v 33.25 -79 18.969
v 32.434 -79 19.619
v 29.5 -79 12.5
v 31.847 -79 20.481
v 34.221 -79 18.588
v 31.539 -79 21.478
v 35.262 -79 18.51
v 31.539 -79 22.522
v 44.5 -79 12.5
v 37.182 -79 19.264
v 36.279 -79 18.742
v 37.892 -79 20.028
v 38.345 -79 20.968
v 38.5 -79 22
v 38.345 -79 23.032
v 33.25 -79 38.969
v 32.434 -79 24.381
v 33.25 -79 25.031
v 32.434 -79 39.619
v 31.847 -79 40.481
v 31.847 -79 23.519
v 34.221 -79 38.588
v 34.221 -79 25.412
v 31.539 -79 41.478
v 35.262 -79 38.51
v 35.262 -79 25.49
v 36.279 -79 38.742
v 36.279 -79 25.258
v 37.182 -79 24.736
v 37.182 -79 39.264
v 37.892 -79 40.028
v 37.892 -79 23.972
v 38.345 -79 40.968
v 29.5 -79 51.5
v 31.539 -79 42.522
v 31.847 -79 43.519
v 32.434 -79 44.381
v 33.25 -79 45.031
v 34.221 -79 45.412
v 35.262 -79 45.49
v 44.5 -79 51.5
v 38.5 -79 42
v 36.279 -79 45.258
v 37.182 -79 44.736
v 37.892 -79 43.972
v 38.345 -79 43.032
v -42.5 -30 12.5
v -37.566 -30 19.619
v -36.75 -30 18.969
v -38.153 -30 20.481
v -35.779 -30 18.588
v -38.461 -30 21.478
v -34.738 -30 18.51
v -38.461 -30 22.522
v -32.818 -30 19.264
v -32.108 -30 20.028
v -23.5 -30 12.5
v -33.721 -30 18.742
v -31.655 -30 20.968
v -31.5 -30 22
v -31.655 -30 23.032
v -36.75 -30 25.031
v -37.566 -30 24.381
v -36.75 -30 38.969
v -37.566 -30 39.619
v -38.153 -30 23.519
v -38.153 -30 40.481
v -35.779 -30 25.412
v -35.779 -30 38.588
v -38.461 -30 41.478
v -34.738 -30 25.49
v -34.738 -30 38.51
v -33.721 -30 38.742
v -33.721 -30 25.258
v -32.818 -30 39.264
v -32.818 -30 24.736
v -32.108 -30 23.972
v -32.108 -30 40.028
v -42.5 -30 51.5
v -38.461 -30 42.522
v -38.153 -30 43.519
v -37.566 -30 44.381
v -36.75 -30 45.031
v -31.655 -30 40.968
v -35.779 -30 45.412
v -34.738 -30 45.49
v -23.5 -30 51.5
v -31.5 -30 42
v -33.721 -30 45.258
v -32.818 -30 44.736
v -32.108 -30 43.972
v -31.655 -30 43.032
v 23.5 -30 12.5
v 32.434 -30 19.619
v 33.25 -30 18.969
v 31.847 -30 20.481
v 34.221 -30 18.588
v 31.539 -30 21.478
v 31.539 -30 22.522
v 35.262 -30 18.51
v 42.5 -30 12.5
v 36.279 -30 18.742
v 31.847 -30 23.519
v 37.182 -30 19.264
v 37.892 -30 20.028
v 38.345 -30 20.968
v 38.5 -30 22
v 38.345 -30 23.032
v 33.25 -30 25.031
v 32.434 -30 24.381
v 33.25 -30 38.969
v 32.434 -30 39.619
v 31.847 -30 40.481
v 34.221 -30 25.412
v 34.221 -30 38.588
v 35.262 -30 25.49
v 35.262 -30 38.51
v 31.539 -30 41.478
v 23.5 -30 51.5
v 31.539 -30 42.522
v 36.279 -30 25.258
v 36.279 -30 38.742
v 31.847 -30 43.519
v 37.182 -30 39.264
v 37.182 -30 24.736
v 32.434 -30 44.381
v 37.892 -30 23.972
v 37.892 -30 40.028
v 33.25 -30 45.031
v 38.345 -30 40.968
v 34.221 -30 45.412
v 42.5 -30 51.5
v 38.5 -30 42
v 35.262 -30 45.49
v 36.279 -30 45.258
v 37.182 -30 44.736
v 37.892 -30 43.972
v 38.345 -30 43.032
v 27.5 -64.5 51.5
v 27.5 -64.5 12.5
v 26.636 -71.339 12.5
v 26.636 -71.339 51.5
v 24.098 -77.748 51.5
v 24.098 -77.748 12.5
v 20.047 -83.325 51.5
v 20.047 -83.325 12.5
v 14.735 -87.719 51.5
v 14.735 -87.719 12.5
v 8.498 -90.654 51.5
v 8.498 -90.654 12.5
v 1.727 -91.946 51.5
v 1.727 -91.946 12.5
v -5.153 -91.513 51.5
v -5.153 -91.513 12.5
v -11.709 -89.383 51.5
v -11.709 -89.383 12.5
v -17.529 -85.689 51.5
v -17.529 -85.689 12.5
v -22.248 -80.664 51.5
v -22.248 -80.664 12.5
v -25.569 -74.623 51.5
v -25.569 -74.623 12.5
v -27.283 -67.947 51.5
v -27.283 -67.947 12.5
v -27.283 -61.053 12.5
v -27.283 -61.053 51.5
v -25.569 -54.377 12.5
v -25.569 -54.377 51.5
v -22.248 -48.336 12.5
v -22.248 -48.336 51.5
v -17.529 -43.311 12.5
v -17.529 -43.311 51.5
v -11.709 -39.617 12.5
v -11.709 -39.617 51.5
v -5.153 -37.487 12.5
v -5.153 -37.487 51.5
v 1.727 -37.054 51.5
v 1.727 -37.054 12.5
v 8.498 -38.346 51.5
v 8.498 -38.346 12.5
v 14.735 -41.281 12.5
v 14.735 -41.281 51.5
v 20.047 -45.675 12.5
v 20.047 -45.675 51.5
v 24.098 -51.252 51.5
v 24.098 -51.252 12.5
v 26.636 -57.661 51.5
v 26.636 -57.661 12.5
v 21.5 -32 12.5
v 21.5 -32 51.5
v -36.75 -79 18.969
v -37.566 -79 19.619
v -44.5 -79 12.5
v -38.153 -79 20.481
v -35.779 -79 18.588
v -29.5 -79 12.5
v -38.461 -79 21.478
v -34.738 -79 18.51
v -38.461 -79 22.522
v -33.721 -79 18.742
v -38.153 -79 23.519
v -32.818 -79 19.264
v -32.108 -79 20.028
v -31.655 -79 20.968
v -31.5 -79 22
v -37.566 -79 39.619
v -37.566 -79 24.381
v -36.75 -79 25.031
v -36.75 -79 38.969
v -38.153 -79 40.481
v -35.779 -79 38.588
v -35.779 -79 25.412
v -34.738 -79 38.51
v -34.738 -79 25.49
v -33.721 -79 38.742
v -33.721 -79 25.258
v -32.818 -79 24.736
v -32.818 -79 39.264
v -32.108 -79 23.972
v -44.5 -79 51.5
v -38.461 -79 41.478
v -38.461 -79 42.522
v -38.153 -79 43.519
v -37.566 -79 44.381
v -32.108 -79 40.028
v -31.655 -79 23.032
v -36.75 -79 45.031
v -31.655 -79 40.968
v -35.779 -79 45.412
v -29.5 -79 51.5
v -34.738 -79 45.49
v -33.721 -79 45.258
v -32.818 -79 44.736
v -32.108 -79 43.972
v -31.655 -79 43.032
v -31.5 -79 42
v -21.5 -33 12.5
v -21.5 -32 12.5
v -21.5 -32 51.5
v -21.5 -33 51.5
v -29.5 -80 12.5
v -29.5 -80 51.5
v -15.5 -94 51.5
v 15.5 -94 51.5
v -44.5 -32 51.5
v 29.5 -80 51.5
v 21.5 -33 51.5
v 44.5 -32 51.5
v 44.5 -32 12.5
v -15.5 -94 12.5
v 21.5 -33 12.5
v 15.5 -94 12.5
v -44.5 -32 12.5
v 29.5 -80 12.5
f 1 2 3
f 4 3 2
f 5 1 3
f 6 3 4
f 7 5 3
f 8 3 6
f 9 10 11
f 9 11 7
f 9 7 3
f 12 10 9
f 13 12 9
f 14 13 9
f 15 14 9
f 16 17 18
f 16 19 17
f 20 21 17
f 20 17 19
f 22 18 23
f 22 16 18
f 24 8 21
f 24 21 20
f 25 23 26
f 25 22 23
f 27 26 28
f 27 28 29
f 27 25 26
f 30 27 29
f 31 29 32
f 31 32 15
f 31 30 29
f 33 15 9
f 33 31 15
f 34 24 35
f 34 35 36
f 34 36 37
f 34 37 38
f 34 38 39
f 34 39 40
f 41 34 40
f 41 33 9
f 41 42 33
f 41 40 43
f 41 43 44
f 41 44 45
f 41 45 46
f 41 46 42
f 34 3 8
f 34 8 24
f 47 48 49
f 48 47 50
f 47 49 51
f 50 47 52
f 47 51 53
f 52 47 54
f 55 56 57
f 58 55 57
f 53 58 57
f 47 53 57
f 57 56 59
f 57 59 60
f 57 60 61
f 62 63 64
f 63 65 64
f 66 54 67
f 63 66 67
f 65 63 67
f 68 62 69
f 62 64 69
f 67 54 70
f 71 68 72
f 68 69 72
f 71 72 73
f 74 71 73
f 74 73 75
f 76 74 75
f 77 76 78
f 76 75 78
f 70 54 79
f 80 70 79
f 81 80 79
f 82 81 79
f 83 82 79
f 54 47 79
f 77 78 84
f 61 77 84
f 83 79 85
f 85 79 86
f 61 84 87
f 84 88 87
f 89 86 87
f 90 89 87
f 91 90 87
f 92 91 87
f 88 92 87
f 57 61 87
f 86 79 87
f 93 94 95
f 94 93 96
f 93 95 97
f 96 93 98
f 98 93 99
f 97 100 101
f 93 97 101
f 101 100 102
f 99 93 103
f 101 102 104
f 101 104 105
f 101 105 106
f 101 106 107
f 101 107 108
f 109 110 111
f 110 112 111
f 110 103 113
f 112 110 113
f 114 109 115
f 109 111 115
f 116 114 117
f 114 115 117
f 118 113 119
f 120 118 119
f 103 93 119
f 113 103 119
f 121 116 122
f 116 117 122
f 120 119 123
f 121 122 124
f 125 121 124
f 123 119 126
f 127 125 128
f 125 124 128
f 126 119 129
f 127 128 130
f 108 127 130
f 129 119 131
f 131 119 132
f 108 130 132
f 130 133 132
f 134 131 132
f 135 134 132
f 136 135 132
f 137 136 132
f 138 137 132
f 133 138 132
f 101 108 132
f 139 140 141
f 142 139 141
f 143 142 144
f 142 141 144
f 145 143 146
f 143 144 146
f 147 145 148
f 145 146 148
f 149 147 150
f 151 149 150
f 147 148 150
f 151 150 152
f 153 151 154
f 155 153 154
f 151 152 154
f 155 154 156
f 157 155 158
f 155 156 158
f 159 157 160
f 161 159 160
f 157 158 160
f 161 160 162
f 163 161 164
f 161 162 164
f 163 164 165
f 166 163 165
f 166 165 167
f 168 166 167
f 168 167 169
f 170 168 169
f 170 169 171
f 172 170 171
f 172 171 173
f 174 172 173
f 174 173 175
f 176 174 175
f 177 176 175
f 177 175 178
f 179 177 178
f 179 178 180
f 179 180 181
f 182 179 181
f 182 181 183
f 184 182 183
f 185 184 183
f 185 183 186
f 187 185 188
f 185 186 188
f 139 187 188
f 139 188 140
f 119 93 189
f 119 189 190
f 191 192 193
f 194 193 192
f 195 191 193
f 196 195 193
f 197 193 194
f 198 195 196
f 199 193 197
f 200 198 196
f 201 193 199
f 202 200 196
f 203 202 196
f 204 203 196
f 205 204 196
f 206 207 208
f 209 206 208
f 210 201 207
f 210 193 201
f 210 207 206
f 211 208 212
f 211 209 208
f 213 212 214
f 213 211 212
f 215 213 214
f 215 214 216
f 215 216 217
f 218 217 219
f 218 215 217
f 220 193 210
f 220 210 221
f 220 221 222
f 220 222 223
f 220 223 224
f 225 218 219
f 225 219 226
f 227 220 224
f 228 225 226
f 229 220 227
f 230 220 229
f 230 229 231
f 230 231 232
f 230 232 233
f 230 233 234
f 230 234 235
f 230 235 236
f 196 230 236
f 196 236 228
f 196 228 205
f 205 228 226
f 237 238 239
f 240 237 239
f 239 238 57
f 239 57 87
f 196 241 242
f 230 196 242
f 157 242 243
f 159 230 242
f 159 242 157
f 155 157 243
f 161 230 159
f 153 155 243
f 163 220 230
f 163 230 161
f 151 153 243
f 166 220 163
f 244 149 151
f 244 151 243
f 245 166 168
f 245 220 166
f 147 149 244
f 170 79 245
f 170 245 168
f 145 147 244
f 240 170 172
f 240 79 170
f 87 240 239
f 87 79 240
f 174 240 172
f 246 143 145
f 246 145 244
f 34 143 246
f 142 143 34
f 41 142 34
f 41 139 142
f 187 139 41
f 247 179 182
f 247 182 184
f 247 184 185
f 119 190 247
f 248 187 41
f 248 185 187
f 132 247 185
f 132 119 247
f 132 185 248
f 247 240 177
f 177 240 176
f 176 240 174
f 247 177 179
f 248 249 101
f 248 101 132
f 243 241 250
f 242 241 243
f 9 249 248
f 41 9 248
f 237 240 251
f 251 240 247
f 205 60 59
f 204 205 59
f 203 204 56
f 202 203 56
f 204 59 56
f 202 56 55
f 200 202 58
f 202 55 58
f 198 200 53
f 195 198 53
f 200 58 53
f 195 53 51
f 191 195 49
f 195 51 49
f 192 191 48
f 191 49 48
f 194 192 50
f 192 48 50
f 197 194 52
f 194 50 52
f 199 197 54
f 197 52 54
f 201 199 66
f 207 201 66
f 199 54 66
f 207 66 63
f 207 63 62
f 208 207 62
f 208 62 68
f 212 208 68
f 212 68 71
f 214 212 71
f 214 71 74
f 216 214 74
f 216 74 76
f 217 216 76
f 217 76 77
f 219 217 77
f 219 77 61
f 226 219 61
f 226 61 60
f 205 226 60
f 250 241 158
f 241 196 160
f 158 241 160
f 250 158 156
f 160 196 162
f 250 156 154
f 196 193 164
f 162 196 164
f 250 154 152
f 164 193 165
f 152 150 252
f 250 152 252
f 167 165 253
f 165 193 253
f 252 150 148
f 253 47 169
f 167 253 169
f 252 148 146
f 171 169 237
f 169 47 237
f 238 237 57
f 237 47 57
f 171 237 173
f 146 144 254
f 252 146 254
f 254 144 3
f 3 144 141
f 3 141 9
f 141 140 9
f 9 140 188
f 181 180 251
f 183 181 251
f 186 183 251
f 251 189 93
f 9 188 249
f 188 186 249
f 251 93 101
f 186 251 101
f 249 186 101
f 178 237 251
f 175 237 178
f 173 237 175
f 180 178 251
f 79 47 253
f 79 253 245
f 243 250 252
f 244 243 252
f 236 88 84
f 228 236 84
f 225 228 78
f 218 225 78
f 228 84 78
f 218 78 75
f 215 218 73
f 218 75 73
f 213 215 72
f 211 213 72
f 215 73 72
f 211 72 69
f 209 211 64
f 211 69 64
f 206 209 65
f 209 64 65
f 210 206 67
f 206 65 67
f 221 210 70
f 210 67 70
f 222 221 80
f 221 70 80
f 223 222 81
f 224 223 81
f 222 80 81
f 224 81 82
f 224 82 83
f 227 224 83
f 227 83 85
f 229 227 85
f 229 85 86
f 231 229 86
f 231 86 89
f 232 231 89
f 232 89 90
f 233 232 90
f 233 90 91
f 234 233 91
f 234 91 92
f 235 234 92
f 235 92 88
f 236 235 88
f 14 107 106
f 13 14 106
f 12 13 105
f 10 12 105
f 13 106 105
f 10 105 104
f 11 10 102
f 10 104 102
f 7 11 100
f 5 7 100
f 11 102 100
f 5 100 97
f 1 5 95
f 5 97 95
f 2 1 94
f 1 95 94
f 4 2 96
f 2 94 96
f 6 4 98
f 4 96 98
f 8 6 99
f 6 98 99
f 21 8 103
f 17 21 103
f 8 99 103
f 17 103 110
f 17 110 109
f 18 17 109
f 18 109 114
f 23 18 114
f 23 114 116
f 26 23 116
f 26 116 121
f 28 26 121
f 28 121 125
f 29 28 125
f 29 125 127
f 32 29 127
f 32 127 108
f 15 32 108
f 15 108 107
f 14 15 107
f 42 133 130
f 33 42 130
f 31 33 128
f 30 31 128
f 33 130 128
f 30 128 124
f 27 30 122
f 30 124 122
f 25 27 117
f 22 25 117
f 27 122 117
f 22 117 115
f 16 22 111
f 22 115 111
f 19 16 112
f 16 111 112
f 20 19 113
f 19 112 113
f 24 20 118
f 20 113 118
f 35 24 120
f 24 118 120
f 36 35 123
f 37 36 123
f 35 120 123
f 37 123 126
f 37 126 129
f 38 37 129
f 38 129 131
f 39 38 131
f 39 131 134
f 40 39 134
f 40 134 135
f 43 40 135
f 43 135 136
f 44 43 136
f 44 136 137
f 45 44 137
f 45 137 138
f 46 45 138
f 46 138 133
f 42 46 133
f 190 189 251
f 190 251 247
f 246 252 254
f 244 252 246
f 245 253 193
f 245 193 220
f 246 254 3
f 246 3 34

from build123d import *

# Parameters (mm, degrees)
SKETCH028_W        = 89
SKETCH028_H        = 39
PAD015_DEPTH       = 64
SKETCH029_W        = 43
SKETCH029_H        = 39
POCKET011_DEPTH    = 3
CHAMFER_SIZE       = 2
SKETCH030_R        = 27.5
POCKET012_DEPTH    = 39.001
SKETCH031_W        = 15
SKETCH031_H        = 39
POCKET002_DEPTH    = 15
CHAMFER001_SIZE    = 14
SKETCH032_R        = 3.5
POCKET003_DEPTH    = 64.001
BODY007_ROLL_ANGLE = 90


with BuildPart() as part:
    # Sketch028 → Pad015 (new body)
    with BuildSketch(Plane.XY):
        Rectangle(SKETCH028_W, SKETCH028_H)
    extrude(amount=PAD015_DEPTH)

    # Sketch029 → Pocket011 (cut)
    with BuildSketch(Plane.XY):
        Rectangle(SKETCH029_W, SKETCH029_H)
    extrude(amount=POCKET011_DEPTH, mode=Mode.SUBTRACT)

    # Chamfer
    chamfer_edges = [part.edges().sort_by_distance(p)[0] for p in [
        (21.5, 0, 0),
        (-21.5, 0, 0),
        (44.5, 0, 0),
        (-44.5, 0, 0),
    ]]
    chamfer(chamfer_edges, length=CHAMFER_SIZE)

    # Sketch030 (on Face1 of Chamfer) → Pocket012 (cut, through all)
    with BuildSketch(Plane.XZ.offset(19.5)):
        with Locations((0, 34.5)):
            Circle(SKETCH030_R)
    extrude(amount=-POCKET012_DEPTH, mode=Mode.SUBTRACT)

    # Sketch031 (on Face7 of Pocket012) → Pocket002 (cut)
    with BuildSketch(Plane.XY.offset(64)):
        with Locations((-37, 0)):
            Rectangle(SKETCH031_W, SKETCH031_H)
        with Locations((37, 0)):
            Rectangle(SKETCH031_W, SKETCH031_H)
    extrude(amount=-POCKET002_DEPTH, mode=Mode.SUBTRACT)

    # Chamfer001
    chamfer001_edges = [part.edges().sort_by_distance(p)[0] for p in [
        (29.5, 0, 64),
        (-29.5, 0, 64),
    ]]
    chamfer(chamfer001_edges, length=CHAMFER001_SIZE)

    # Sketch032 (on Face10 of Chamfer001) → Pocket003 (cut, through all)
    with BuildSketch(Plane(origin=(0, 0, 0), x_dir=(1, 0, 0), z_dir=(0, 0, -1))):
        with Locations((-35, -10)):
            Circle(SKETCH032_R)
        with Locations((-35, 10)):
            Circle(SKETCH032_R)
        with Locations((35, 10)):
            Circle(SKETCH032_R)
        with Locations((35, -10)):
            Circle(SKETCH032_R)
    extrude(amount=-POCKET003_DEPTH, mode=Mode.SUBTRACT)


with BuildPart() as part_1:
    # Body007 roll: moved
    add(part.part.rotate(Axis((0, 0, 0), (1, 0, 0)), BODY007_ROLL_ANGLE))


with BuildPart() as part_2:
    # Body007 placement: moved
    add(part_1.part.moved(Location((0, -30, 32))))


solid = part_2.part
